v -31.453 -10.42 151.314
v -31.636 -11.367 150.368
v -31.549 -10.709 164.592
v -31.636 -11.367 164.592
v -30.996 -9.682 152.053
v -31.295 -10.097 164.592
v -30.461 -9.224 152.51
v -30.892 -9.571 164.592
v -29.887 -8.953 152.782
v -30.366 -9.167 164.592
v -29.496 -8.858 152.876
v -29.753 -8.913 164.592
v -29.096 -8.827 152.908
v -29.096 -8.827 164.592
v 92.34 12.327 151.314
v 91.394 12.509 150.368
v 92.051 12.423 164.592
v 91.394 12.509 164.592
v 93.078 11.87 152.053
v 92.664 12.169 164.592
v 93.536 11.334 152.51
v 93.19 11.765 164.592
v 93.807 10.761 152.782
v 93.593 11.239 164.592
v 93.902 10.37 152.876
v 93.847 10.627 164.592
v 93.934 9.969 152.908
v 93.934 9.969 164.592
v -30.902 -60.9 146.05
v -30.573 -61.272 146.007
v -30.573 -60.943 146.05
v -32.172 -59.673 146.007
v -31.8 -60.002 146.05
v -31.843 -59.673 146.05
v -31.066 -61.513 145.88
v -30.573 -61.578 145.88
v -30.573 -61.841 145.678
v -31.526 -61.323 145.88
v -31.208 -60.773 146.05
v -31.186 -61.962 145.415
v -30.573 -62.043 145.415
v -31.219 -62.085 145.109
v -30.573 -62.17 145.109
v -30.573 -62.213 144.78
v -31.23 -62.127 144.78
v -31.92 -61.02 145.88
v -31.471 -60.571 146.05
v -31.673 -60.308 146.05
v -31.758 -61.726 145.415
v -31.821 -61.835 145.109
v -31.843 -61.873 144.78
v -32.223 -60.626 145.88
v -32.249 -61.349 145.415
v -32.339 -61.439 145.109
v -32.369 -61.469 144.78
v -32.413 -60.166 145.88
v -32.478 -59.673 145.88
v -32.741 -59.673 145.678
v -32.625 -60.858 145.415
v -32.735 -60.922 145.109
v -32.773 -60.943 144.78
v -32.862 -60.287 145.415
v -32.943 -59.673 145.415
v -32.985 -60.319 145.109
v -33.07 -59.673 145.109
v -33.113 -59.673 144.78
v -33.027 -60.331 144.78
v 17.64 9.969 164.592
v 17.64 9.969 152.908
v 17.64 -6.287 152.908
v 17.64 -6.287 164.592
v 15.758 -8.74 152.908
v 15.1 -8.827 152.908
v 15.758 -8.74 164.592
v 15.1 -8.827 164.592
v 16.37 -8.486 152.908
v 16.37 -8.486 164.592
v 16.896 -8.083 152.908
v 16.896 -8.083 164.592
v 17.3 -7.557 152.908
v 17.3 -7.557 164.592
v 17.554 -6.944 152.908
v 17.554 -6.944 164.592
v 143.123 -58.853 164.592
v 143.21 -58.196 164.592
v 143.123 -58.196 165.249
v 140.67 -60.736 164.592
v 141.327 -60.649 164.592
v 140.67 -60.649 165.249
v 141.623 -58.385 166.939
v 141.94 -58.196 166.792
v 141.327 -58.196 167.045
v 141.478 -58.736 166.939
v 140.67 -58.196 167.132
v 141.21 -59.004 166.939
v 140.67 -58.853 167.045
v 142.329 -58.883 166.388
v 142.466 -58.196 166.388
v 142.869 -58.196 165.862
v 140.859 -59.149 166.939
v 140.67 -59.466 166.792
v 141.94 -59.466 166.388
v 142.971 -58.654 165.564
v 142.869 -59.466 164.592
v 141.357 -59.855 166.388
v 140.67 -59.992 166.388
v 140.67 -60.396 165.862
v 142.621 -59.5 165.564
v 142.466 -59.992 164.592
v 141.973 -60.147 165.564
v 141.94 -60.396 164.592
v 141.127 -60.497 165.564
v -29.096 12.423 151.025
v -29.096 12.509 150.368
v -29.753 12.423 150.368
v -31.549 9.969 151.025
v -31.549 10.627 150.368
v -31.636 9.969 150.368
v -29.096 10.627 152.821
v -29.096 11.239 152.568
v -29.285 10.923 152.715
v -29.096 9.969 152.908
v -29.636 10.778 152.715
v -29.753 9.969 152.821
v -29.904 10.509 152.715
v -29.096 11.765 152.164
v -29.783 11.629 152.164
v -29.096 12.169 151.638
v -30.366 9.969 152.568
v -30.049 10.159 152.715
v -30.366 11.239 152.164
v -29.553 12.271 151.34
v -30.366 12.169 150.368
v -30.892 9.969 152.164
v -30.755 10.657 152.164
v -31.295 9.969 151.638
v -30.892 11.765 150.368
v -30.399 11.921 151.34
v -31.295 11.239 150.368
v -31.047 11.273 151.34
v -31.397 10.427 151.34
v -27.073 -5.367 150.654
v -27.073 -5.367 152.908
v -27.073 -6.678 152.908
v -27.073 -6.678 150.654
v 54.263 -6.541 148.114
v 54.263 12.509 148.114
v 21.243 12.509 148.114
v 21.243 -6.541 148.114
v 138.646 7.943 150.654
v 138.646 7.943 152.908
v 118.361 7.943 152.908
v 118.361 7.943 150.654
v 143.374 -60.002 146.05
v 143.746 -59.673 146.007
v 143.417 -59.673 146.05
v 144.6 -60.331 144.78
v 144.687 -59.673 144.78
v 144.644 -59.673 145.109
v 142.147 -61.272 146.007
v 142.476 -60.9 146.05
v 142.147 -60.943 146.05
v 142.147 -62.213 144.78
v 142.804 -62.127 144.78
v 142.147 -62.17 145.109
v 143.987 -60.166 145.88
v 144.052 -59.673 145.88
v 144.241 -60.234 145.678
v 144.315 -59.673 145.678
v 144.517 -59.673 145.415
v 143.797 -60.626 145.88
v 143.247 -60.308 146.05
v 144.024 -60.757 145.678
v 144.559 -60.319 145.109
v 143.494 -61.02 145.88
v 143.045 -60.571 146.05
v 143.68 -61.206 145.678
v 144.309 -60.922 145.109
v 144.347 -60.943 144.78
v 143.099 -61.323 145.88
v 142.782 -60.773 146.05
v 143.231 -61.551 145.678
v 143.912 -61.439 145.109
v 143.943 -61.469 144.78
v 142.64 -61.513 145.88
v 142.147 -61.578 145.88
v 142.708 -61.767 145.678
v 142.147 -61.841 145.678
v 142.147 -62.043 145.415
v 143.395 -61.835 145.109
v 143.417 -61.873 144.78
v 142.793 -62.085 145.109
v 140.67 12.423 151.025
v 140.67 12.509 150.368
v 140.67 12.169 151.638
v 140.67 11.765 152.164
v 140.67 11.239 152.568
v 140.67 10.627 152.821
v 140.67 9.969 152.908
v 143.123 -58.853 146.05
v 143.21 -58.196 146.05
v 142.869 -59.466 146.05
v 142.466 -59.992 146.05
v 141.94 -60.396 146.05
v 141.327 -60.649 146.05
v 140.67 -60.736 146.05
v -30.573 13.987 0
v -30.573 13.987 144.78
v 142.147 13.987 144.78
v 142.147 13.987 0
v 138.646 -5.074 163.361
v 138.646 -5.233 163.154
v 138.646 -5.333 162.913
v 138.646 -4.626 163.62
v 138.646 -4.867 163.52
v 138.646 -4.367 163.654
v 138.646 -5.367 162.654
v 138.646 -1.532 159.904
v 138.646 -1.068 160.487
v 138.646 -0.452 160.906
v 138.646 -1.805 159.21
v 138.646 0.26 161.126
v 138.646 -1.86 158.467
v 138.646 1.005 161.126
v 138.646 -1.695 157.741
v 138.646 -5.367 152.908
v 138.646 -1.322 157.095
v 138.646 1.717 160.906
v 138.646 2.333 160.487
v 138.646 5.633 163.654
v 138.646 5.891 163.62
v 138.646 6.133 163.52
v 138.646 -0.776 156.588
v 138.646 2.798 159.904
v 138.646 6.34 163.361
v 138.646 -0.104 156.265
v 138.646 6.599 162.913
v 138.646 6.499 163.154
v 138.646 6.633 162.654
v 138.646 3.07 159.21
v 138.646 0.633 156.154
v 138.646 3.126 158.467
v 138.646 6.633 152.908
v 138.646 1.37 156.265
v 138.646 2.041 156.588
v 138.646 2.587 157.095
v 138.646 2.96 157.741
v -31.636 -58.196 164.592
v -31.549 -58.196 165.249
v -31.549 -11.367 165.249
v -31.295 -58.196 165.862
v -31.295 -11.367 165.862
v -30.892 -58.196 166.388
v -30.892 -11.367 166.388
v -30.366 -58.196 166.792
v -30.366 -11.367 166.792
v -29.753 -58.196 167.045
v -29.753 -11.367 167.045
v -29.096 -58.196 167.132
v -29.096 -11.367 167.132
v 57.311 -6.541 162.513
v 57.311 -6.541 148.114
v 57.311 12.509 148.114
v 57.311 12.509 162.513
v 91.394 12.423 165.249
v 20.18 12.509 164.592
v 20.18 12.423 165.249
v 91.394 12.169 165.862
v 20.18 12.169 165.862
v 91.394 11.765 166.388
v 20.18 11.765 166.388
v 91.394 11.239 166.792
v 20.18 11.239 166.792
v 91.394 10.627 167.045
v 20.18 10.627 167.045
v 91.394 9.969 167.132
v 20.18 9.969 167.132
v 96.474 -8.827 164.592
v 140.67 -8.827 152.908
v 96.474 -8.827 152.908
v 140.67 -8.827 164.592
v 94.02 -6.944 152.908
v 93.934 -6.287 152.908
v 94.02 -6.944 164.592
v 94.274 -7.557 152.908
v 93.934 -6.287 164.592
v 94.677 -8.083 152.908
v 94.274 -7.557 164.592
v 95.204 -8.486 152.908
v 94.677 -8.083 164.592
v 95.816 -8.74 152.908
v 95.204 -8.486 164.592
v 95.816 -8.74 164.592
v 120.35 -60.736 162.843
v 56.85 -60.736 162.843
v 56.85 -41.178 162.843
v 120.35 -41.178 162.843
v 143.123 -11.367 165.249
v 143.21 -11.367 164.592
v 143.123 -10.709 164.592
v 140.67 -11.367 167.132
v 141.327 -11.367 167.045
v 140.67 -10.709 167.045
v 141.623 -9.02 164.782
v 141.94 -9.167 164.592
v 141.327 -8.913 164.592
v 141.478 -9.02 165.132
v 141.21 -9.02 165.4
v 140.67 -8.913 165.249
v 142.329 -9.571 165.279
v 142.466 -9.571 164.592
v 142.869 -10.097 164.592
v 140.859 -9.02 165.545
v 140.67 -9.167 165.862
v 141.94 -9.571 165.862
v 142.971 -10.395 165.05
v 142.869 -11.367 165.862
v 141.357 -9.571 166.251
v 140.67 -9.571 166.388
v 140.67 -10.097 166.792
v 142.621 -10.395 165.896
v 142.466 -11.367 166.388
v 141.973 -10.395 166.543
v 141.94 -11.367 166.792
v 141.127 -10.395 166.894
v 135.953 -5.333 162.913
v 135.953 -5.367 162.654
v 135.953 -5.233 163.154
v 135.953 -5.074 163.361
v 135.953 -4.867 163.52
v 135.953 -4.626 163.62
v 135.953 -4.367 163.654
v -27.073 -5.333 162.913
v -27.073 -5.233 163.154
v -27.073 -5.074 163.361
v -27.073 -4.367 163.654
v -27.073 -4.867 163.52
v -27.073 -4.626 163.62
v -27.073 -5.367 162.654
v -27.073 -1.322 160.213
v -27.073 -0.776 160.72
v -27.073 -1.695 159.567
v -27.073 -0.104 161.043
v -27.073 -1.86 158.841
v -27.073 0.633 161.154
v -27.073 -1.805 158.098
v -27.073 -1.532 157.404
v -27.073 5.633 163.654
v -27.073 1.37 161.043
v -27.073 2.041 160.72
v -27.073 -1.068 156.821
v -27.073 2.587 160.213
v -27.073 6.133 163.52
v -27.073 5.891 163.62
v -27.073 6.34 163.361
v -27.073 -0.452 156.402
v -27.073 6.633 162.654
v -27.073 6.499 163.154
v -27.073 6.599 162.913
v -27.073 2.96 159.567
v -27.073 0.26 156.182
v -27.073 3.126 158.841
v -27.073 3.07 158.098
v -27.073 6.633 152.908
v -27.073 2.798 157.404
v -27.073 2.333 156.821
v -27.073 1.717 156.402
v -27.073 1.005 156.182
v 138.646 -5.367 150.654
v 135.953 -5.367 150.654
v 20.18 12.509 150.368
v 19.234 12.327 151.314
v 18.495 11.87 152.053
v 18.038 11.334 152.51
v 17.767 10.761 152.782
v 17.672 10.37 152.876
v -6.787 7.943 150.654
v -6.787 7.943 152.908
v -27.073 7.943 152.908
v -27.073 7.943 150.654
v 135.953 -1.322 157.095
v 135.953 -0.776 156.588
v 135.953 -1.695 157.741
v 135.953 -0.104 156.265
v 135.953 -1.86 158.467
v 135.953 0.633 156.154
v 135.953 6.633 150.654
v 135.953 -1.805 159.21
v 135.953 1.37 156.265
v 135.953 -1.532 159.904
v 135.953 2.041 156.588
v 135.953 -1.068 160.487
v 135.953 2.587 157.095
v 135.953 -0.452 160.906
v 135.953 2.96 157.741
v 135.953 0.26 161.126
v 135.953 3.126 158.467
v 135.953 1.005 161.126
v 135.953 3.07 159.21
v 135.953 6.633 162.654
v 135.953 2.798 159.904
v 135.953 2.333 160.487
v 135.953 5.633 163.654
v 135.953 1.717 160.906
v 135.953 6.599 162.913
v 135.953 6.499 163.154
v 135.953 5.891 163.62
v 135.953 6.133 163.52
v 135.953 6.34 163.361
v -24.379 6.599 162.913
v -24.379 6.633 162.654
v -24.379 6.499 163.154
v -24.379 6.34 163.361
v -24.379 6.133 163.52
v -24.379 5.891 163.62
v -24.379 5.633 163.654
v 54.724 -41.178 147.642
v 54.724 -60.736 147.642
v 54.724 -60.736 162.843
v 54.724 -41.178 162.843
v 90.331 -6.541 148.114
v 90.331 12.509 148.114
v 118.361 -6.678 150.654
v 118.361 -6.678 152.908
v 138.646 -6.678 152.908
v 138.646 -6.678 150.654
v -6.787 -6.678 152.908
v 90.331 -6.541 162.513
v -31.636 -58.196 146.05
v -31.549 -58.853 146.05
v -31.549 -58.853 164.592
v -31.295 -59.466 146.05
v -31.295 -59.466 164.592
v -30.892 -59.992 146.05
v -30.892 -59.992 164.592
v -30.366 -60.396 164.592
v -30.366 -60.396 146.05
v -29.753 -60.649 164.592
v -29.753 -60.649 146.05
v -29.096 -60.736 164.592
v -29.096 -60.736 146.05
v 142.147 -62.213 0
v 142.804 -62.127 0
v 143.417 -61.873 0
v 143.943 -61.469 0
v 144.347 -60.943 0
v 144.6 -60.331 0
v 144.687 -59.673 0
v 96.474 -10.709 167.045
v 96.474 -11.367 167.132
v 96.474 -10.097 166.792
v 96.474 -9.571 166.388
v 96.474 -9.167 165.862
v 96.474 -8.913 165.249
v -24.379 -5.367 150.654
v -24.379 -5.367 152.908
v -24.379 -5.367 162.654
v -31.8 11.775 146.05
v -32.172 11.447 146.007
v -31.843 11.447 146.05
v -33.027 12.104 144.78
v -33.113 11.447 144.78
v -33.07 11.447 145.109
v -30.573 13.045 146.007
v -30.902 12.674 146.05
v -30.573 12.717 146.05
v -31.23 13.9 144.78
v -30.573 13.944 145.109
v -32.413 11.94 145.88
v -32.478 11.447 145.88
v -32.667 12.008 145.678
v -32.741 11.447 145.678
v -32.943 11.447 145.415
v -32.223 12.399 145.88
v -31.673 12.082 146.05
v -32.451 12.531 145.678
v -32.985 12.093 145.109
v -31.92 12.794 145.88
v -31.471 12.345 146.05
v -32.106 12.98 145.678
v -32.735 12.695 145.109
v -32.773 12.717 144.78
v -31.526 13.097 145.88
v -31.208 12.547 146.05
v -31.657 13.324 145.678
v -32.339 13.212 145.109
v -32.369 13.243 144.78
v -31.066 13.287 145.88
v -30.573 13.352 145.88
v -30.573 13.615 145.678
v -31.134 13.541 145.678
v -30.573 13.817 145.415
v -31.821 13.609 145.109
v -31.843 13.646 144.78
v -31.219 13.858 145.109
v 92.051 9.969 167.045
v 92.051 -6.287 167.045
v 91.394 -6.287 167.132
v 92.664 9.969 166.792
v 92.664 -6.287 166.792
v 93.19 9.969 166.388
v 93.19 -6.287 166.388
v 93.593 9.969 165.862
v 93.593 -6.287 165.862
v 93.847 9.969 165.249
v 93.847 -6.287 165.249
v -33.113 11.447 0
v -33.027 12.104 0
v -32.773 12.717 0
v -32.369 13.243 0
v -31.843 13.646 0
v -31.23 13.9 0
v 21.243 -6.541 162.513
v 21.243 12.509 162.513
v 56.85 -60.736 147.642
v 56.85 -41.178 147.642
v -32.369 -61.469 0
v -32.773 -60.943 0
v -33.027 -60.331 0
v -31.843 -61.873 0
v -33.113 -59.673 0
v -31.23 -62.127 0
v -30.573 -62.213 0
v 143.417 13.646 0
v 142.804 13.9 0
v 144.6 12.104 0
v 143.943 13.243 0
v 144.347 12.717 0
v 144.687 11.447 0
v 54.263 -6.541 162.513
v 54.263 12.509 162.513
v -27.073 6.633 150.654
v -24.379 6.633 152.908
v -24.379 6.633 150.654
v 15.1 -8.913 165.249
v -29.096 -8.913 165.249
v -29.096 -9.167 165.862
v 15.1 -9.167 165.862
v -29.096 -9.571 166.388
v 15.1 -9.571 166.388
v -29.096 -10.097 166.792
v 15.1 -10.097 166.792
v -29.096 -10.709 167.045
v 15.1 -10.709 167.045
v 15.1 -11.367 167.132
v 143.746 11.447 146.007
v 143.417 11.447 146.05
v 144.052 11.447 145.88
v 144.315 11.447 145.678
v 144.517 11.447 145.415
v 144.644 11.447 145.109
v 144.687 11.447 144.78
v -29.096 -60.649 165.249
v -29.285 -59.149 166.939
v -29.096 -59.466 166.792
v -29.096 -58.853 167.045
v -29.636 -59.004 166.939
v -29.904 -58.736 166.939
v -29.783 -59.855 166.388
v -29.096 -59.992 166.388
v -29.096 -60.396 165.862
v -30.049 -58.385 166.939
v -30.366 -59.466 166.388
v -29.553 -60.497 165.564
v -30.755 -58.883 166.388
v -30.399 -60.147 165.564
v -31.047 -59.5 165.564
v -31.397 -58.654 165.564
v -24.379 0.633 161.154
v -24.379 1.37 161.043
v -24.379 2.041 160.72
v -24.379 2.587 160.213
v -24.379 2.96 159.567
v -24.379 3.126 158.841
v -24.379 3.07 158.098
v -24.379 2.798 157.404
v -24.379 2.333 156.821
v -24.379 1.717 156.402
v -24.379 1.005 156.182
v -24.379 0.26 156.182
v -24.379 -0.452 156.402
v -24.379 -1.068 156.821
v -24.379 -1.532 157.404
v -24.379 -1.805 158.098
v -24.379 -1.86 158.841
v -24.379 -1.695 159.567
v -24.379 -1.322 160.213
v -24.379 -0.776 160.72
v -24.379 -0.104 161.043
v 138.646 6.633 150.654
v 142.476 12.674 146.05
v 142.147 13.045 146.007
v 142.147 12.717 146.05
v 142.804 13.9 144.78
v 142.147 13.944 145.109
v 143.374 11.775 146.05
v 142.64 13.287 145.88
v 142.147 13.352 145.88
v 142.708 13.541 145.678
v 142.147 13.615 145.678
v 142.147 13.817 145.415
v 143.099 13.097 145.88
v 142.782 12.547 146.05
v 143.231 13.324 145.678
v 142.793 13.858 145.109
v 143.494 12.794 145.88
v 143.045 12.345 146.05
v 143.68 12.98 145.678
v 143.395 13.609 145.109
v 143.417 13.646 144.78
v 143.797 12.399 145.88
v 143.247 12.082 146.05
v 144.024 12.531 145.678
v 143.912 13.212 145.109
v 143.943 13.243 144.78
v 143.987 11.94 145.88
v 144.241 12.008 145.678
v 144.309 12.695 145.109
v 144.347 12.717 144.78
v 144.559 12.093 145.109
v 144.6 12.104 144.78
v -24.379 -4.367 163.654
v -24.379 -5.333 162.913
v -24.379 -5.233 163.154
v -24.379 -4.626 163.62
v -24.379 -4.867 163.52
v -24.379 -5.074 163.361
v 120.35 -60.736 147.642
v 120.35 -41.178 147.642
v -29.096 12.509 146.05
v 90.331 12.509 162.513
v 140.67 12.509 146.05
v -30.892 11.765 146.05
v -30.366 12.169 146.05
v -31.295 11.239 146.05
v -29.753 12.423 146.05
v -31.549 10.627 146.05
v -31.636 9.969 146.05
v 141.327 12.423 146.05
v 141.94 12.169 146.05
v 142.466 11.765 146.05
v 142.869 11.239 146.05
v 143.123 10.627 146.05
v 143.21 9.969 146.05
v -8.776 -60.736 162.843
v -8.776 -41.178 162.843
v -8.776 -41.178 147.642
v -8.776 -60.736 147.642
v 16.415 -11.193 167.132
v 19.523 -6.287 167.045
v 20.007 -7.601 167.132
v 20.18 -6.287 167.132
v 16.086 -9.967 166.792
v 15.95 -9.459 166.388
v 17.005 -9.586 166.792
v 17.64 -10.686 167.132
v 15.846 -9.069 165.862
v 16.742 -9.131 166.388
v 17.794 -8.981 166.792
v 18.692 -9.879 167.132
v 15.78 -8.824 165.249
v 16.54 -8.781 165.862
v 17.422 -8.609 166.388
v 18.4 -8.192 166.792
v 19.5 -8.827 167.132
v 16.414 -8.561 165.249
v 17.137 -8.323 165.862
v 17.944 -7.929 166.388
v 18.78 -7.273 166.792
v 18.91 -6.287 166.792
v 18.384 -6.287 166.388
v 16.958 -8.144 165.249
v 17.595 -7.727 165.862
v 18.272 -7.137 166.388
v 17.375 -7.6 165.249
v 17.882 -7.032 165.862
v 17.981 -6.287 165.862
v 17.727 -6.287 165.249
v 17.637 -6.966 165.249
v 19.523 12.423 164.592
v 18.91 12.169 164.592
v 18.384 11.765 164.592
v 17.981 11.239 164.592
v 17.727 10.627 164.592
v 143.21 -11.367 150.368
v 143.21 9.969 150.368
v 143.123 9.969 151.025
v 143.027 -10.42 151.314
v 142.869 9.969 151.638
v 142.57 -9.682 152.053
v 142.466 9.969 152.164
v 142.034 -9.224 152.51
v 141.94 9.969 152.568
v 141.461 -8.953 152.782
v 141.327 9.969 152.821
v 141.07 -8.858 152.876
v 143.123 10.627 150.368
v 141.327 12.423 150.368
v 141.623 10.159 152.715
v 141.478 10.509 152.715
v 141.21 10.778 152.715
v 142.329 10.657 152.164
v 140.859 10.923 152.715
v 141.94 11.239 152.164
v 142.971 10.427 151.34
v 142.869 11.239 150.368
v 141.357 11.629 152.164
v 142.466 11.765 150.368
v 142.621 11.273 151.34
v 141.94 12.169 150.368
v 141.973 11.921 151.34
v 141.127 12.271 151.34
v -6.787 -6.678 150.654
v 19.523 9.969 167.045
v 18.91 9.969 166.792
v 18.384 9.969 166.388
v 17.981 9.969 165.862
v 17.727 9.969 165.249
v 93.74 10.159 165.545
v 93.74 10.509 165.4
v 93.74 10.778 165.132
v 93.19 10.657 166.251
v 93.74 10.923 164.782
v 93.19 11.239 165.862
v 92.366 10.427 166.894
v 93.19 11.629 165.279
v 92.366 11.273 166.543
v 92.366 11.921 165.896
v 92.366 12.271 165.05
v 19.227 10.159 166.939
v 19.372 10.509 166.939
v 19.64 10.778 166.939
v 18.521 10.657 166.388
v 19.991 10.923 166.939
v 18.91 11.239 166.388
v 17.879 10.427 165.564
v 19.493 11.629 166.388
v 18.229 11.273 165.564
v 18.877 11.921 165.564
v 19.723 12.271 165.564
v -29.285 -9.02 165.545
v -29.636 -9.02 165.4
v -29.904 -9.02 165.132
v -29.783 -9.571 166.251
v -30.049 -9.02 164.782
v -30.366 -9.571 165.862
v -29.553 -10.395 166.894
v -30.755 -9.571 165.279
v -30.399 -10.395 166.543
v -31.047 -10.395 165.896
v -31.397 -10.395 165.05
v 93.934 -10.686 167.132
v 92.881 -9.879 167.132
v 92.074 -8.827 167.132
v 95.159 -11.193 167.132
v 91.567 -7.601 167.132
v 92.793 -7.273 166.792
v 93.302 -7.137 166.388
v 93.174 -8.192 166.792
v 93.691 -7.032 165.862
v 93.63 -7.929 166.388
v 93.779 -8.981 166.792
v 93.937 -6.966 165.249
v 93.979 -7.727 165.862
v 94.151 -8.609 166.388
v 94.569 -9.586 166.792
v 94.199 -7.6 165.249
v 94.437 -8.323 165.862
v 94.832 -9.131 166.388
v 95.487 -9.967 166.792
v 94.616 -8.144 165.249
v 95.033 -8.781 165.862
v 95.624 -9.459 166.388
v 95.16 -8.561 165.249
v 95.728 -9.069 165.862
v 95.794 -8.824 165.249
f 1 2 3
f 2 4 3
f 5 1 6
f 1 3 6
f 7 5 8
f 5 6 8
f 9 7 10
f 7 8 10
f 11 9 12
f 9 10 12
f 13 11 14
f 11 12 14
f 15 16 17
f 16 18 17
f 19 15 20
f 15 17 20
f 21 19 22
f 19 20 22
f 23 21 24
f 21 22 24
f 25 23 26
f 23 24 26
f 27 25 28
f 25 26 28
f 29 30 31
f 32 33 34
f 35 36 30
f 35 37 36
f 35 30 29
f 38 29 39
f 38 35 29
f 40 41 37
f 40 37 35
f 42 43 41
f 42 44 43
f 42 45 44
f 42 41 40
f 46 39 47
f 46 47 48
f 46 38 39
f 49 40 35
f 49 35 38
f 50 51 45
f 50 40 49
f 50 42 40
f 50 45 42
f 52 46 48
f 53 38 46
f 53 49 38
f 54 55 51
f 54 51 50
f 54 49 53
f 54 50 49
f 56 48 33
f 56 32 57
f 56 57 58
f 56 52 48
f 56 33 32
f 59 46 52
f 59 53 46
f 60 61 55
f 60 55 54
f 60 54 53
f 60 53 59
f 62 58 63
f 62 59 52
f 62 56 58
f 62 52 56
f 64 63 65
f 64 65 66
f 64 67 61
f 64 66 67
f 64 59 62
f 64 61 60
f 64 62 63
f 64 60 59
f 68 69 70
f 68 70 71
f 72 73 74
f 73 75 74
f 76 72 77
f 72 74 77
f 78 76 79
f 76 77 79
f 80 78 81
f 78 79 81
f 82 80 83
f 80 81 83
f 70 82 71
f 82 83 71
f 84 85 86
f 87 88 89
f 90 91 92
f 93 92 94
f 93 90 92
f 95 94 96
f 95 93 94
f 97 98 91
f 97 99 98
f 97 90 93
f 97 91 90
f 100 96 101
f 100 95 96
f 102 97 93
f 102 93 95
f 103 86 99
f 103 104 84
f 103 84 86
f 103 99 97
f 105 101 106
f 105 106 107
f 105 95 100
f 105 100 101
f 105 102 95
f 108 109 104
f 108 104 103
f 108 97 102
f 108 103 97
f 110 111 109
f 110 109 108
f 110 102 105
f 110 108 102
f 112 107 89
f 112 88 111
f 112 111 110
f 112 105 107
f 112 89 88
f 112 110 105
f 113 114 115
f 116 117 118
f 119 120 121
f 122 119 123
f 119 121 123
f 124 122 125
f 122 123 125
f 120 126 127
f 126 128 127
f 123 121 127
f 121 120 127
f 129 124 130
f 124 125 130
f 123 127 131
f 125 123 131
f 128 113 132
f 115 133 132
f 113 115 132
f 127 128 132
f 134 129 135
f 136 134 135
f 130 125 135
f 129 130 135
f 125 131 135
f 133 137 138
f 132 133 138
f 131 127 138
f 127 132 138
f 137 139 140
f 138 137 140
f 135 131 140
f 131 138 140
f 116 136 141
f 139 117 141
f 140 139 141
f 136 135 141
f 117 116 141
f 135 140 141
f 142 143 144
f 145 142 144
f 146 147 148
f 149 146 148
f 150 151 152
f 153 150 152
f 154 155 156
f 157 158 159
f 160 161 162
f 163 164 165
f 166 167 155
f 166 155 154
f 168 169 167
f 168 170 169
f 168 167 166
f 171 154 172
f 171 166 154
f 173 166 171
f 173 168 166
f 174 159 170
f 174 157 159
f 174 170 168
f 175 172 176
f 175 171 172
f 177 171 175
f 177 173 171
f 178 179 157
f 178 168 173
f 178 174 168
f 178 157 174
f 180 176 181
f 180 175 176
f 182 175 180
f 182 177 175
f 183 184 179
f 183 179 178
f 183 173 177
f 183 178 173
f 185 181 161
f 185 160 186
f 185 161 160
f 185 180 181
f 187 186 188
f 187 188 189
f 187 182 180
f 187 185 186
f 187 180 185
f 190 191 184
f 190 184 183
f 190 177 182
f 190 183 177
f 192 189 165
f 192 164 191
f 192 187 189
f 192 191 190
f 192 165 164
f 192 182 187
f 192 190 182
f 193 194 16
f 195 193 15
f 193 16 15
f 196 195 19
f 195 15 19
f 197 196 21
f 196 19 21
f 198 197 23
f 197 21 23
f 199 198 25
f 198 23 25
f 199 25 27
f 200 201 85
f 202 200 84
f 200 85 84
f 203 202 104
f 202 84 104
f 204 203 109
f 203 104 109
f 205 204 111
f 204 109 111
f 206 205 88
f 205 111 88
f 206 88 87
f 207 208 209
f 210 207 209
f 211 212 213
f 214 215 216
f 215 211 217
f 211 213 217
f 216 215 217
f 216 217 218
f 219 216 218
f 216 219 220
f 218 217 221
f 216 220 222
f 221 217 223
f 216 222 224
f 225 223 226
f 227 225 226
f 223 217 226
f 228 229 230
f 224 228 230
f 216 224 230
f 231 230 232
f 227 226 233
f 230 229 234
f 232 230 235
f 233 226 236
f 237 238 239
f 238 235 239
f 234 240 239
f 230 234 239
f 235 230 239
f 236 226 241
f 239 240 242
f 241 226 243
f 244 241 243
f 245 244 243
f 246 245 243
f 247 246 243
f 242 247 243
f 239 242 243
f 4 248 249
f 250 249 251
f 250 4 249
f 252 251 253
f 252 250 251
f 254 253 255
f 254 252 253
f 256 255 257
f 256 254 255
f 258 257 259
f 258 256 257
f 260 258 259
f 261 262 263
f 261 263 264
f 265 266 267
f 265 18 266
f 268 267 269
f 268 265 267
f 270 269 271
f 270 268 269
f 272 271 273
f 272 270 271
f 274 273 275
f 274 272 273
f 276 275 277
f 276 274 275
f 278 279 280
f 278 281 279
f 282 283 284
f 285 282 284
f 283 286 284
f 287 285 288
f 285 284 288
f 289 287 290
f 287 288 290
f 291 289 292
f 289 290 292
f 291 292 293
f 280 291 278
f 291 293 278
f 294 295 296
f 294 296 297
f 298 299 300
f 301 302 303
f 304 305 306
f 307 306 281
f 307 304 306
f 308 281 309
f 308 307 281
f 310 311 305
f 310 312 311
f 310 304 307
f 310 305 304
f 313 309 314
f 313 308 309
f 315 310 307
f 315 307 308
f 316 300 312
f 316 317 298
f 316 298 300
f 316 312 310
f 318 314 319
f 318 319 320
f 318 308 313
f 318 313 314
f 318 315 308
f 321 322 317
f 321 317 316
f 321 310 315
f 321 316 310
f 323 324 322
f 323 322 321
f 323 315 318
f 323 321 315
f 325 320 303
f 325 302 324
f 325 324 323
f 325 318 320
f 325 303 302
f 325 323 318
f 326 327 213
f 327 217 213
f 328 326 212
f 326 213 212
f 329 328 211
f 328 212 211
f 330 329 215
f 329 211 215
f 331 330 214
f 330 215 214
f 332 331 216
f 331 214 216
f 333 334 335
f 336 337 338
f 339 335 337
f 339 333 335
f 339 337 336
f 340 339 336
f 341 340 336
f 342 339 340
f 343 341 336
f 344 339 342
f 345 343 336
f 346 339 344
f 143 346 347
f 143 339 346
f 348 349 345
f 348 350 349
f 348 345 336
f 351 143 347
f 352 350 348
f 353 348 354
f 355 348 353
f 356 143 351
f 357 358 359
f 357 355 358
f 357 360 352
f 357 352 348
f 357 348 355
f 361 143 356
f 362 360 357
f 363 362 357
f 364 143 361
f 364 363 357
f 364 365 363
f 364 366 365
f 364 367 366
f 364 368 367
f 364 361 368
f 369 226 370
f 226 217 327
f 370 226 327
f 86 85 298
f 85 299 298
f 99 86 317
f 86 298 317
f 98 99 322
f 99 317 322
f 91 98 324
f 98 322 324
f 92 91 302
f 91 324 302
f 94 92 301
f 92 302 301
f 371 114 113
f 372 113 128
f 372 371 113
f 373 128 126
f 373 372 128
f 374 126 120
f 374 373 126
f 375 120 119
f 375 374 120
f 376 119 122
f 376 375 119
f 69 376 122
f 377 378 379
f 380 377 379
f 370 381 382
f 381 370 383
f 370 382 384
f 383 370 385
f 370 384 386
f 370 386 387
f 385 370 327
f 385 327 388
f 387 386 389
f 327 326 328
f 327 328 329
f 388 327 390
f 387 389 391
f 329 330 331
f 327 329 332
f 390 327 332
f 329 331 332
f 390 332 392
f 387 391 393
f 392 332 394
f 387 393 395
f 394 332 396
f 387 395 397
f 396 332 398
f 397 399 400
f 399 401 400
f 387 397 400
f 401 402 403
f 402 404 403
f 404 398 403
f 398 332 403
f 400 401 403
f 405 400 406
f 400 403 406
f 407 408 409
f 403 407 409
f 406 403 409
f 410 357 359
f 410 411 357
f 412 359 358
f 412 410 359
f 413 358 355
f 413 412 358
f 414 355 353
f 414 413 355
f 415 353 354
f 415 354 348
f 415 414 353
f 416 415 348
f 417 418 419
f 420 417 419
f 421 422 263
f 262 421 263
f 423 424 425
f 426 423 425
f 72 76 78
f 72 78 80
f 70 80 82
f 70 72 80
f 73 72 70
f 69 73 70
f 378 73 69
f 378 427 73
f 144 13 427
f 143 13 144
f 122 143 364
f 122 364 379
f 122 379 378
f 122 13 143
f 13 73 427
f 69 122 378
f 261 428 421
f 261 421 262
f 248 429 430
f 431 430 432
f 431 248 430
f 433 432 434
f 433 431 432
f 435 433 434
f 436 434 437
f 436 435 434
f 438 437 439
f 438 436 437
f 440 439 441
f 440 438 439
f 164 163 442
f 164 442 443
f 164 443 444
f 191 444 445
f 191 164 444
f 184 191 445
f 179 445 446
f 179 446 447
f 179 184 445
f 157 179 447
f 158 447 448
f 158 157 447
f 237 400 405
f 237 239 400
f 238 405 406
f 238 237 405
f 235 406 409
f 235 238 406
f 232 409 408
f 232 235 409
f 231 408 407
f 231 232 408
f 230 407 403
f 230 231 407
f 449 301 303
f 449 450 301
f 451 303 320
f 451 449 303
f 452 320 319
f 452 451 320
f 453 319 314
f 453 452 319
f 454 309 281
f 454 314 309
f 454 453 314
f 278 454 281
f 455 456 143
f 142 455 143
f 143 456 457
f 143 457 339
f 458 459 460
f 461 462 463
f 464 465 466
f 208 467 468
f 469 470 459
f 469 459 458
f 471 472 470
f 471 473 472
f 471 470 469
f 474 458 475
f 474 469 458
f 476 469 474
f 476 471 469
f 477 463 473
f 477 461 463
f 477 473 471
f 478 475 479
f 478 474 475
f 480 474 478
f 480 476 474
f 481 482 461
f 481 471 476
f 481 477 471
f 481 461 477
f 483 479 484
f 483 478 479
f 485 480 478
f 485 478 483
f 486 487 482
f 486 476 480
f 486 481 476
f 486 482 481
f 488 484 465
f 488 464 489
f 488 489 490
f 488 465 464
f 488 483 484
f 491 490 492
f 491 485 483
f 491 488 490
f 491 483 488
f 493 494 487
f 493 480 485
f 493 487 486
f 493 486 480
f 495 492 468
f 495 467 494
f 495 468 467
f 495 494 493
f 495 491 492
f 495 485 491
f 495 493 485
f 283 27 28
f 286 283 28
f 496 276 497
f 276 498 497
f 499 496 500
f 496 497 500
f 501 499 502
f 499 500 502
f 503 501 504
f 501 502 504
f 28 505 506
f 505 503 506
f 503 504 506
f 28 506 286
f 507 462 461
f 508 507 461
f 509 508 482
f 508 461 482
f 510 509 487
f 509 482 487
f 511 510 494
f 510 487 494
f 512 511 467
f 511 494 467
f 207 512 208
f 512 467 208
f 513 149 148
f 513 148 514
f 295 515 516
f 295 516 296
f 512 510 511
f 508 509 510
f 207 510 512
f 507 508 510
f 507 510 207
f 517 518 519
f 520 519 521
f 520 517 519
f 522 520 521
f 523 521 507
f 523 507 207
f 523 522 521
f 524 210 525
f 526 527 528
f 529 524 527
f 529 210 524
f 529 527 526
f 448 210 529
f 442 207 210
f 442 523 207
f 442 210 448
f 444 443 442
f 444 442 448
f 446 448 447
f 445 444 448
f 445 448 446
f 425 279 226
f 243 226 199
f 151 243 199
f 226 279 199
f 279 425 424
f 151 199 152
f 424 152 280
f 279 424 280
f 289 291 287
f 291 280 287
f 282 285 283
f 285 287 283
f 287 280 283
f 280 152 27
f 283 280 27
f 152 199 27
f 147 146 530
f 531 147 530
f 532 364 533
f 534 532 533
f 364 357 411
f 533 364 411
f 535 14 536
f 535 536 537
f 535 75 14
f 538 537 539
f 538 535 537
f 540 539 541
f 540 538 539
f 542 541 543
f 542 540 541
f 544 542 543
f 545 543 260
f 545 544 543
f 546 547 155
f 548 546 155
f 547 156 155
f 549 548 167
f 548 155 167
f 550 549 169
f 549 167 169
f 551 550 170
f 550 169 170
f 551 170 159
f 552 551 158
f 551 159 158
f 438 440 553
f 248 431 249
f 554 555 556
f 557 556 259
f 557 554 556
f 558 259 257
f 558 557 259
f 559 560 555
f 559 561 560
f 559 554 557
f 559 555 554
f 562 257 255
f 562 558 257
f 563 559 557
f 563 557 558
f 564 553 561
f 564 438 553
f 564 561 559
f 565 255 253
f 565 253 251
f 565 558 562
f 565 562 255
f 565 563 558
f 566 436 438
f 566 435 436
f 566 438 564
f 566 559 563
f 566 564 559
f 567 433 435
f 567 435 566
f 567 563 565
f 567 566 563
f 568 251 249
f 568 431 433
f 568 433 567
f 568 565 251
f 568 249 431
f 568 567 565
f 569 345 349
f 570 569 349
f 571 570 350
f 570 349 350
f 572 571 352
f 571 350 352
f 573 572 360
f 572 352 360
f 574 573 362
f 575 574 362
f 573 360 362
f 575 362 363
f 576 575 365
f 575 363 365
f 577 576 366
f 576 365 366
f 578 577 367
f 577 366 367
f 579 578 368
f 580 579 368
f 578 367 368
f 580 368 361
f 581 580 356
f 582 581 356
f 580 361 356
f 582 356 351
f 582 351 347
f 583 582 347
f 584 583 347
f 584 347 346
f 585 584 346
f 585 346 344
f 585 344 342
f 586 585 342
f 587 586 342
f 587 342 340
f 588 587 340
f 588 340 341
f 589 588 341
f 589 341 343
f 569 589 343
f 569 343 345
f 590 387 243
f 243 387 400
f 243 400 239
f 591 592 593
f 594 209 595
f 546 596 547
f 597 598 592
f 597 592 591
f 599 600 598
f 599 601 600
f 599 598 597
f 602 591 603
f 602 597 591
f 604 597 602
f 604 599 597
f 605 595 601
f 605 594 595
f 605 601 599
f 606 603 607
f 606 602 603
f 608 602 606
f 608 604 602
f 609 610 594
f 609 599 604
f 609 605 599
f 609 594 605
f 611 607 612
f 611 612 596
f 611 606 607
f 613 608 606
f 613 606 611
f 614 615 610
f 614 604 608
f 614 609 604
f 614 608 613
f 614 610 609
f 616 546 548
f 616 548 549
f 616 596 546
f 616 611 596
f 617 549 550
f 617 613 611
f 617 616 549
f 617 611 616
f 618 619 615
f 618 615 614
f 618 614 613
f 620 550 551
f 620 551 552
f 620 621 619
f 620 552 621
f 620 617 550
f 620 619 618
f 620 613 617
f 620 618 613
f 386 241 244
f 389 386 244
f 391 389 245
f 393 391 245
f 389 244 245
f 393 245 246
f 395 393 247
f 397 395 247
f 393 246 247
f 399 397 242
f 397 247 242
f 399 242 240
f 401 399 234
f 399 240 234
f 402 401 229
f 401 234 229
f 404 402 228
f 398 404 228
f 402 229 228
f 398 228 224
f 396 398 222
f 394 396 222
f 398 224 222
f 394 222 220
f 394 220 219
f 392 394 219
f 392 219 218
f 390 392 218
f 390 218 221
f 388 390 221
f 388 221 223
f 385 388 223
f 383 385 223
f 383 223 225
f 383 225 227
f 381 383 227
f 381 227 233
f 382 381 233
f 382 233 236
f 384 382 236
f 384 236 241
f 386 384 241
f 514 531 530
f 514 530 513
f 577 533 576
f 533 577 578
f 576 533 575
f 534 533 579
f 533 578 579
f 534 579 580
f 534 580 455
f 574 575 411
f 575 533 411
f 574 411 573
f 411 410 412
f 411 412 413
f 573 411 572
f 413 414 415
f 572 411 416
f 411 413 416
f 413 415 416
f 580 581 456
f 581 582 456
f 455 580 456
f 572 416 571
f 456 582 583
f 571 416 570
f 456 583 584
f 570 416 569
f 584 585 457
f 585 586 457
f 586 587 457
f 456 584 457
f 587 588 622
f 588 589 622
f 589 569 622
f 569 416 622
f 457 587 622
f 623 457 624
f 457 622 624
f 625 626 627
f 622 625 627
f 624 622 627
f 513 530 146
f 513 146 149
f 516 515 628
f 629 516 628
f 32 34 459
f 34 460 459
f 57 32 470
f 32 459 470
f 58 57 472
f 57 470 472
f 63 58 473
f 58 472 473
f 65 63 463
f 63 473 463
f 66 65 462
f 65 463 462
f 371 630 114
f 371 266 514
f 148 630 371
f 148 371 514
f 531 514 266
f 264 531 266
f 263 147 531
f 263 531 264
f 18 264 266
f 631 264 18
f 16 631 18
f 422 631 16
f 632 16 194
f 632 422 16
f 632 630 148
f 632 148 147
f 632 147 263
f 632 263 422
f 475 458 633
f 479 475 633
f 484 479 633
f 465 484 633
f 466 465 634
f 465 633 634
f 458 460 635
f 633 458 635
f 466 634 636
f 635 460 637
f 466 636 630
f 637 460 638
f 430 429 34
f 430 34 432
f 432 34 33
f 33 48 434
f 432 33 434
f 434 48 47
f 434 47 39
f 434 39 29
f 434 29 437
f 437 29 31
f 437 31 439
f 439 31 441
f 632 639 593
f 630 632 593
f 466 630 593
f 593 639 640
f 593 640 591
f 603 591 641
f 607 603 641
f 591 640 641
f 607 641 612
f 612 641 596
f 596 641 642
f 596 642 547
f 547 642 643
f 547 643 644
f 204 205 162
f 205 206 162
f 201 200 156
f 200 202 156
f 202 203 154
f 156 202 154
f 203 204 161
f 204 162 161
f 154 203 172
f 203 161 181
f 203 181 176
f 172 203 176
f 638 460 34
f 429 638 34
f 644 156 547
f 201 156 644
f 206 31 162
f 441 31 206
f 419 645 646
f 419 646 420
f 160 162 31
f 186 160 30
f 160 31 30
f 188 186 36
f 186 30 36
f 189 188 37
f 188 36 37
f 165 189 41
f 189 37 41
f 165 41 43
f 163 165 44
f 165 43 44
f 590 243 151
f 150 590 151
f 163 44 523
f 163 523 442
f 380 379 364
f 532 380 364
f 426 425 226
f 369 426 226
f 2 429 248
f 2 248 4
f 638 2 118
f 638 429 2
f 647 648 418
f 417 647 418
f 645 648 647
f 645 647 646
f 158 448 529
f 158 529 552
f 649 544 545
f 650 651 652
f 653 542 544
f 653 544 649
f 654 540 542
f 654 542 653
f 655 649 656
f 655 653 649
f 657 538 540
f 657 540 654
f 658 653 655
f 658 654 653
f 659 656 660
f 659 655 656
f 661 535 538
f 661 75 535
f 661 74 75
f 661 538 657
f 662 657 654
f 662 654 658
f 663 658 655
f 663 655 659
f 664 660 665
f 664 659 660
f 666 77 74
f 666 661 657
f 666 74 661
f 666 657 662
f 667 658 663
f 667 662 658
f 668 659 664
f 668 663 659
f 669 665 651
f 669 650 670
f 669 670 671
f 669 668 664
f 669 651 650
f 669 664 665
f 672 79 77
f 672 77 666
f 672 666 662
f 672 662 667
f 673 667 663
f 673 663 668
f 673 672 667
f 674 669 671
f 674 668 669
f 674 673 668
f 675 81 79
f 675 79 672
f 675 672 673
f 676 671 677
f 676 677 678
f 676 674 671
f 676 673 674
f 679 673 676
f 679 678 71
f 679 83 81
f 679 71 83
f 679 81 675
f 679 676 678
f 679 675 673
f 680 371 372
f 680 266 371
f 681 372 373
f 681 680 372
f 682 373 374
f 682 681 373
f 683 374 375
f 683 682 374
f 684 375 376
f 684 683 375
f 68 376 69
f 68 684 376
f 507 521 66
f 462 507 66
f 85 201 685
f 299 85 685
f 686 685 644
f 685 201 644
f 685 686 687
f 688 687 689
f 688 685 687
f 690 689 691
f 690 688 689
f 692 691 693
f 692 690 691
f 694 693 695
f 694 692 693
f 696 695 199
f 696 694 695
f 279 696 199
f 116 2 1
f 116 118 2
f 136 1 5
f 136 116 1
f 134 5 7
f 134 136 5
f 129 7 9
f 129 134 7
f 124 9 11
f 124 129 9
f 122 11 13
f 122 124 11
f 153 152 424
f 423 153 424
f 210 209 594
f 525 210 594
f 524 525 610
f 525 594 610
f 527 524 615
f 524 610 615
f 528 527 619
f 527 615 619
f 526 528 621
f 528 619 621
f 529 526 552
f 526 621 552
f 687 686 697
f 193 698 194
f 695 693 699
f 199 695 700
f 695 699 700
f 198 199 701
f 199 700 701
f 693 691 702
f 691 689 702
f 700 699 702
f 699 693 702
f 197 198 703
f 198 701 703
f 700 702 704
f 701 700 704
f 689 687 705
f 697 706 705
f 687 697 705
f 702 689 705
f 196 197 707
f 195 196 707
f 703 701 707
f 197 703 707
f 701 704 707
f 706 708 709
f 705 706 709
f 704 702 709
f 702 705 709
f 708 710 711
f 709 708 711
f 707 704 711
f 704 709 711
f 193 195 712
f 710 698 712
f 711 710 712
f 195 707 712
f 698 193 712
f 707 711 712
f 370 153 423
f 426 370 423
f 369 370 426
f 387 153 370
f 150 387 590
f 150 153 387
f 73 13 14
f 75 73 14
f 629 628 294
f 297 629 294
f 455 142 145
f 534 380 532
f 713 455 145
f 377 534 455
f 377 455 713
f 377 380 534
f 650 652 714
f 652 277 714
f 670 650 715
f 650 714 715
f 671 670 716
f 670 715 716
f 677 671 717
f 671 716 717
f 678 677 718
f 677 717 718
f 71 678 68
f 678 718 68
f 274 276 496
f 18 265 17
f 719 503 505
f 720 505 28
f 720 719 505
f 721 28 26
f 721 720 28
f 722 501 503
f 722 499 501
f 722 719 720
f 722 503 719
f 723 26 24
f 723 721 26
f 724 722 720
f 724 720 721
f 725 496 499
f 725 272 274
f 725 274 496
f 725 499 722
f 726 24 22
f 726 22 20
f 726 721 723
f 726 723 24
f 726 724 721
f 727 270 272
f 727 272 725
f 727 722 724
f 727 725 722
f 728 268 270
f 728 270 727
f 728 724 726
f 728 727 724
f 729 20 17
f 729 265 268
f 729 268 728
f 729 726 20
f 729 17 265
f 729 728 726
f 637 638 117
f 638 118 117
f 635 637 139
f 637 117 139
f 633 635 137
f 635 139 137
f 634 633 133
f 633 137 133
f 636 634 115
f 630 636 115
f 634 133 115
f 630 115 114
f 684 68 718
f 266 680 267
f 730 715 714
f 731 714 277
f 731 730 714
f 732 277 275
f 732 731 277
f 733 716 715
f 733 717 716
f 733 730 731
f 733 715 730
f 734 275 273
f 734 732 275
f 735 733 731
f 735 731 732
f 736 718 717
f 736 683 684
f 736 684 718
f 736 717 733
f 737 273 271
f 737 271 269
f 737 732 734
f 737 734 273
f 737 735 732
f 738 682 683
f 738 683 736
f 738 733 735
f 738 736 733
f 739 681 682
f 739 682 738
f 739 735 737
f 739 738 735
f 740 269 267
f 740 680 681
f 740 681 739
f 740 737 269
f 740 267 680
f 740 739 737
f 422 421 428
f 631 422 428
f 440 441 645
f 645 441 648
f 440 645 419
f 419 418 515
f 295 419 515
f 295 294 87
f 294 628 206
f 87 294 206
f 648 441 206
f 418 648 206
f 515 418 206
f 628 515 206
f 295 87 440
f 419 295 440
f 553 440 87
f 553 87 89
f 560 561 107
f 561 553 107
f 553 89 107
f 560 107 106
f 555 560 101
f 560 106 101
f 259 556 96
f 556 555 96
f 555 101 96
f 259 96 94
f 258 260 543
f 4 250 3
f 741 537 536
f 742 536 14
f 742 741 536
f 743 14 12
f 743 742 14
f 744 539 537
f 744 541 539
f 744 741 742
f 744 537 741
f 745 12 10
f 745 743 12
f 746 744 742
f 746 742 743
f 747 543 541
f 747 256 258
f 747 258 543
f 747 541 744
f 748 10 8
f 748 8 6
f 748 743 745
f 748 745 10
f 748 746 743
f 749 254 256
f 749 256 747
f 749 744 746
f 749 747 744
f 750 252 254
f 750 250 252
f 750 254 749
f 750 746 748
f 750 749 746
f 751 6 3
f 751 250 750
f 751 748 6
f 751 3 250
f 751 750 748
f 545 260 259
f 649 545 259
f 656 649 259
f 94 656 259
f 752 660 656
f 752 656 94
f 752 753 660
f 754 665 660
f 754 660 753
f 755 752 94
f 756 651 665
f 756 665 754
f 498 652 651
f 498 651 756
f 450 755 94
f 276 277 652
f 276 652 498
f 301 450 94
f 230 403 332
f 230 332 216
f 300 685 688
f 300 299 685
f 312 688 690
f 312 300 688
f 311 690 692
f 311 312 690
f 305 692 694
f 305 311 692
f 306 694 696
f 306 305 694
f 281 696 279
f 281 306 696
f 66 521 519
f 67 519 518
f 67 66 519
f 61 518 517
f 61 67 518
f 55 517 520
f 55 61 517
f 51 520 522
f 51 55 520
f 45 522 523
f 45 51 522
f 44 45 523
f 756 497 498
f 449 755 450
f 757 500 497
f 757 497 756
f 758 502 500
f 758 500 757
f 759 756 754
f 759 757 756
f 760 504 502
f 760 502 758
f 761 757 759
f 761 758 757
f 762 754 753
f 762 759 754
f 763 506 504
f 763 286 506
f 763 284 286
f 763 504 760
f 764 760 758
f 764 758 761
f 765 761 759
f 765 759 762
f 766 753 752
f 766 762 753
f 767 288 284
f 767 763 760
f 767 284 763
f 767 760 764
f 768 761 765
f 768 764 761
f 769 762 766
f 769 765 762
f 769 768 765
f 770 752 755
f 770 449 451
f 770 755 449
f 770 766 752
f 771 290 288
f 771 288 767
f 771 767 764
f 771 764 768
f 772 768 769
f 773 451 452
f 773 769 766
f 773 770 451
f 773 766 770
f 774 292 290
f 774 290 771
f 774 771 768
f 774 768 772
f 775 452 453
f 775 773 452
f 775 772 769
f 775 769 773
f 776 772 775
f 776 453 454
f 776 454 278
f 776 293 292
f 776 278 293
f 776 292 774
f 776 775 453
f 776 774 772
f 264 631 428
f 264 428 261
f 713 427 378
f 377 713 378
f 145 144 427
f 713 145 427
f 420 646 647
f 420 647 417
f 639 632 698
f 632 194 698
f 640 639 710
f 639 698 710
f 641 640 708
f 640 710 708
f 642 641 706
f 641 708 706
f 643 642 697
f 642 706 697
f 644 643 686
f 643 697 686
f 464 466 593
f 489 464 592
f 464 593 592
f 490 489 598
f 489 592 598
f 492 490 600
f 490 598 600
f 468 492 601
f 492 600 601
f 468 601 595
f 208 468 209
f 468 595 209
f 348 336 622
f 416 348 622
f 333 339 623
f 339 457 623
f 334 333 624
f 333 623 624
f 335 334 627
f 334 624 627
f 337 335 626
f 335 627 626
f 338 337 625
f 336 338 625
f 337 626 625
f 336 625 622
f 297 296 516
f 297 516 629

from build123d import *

# Parameters (mm, degrees)
SKETCH1_W                    = 177.8
SKETCH1_H                    = 146.05
BOSS_EXTRUDE1_DEPTH          = 76.2
SKETCH2_W                    = 174.845239449
SKETCH2_H                    = 73.245239449
BOSS_EXTRUDE2_DEPTH          = 21.082
SKETCH3_W                    = 14.224
SKETCH3_H                    = 21.336
CUT_EXTRUDE1_DEPTH           = 49.276
SKETCH4_W                    = 2.693561453
SKETCH4_H                    = 12
BOSS_EXTRUDE3_DEPTH          = 10.746
CUT_EXTRUDE2_DEPTH           = 2.254
SKETCH6_W                    = 49.276
SKETCH6_H                    = 14.224
CUT_EXTRUDE3_DEPTH           = 21.336
SKETCH7_W                    = 2.693561452
SKETCH7_H                    = 12
BOSS_EXTRUDE4_DEPTH          = 10.746
CUT_EXTRUDE4_DEPTH           = 2.254
SKETCH9_W                    = 33.02
SKETCH9_H                    = 14.399652357
CUT_EXTRUDE5_DEPTH           = 19.05
SKETCH10_W                   = 33.02
SKETCH10_H                   = 14.399652357
CUT_EXTRUDE6_DEPTH           = 19.05
SKETCH11_W                   = 63.5
SKETCH11_H                   = 15.201284342
CUT_EXTRUDE7_DEPTH           = 19.558
SKETCH12_W                   = 63.5
SKETCH12_H                   = 15.201284342
CUT_EXTRUDE8_DEPTH           = 19.558
F_5_0_5_DIAMETER_HOLE1_D     = 5
F_5_0_5_DIAMETER_HOLE1_DEPTH = 8.734014926
F_5_0_5_DIAMETER_HOLE2_D     = 5
F_5_0_5_DIAMETER_HOLE2_DEPTH = 8.734014926
FILLET1_R                    = 2.54
FILLET2_R                    = 1
FILLET3_R                    = 1.27


with BuildPart() as part:
    # Sketch1 → Boss-Extrude1 (new body)
    with BuildSketch(Plane.XZ.offset(62.213215728)):
        with Locations((55.786931477, 73.025)):
            Rectangle(SKETCH1_W, SKETCH1_H)
    extrude(amount=-BOSS_EXTRUDE1_DEPTH)

    # Sketch2 → Boss-Extrude2 (add)
    with BuildSketch(Plane.XY.offset(146.05)):
        with Locations((55.786931477, -24.113215728)):
            Rectangle(SKETCH2_W, SKETCH2_H)
    extrude(amount=BOSS_EXTRUDE2_DEPTH)

    # Sketch3 → Cut-Extrude1 (cut)
    with BuildSketch(Plane.ZY.offset(31.635688247)):
        with Locations((160.02, 1.841403997)):
            Rectangle(SKETCH3_W, SKETCH3_H)
    extrude(amount=-CUT_EXTRUDE1_DEPTH, mode=Mode.SUBTRACT)

    # Sketch4 → Boss-Extrude3 (add)
    with BuildSketch(Plane.XY.offset(152.908)):
        with Locations((-25.725834324, 0.632623113)):
            Rectangle(SKETCH4_W, SKETCH4_H)
    extrude(amount=BOSS_EXTRUDE3_DEPTH)

    # Sketch5 → Cut-Extrude2 (cut)
    with BuildSketch(Plane.XY.offset(152.908)):
        Polygon((-27.07261505, 6.632623113), (-24.379053597, 6.632623113), (-24.379053597, -5.367376887), (-27.07261505, -5.367376887), (-27.07261505, -6.677584717), (-6.787176985, -6.677584717), (-6.787176985, 7.942830943), (-27.07261505, 7.942830943), align=None)
    extrude(amount=-CUT_EXTRUDE2_DEPTH, mode=Mode.SUBTRACT)

    # Sketch6 → Cut-Extrude3 (cut)
    with BuildSketch(Plane(origin=(0, 12.509403997, 0), x_dir=(-1, 0, 0), z_dir=(0, 1, 0))):
        with Locations((-118.571551202, 160.02)):
            Rectangle(SKETCH6_W, SKETCH6_H)
    extrude(amount=-CUT_EXTRUDE3_DEPTH, mode=Mode.SUBTRACT)

    # Sketch7 → Boss-Extrude4 (add)
    with BuildSketch(Plane.XY.offset(152.908)):
        with Locations((137.299697278, 0.632623113)):
            Rectangle(SKETCH7_W, SKETCH7_H)
    extrude(amount=BOSS_EXTRUDE4_DEPTH)

    # Sketch8 → Cut-Extrude4 (cut)
    with BuildSketch(Plane.XY.offset(152.908)):
        Polygon((138.646478004, -5.367376887), (135.952916552, -5.367376887), (135.952916552, 6.632623113), (138.646478004, 6.632623113), (138.646478004, 7.942830943), (118.361039939, 7.942830943), (118.361039939, -6.677584717), (138.646478004, -6.677584717), align=None)
    extrude(amount=-CUT_EXTRUDE4_DEPTH, mode=Mode.SUBTRACT)

    # Sketch9 → Cut-Extrude5 (cut)
    with BuildSketch(Plane(origin=(0, 12.509403997, 0), x_dir=(-1, 0, 0), z_dir=(0, 1, 0))):
        with Locations((-73.820931477, 155.313650768)):
            Rectangle(SKETCH9_W, SKETCH9_H)
    extrude(amount=-CUT_EXTRUDE5_DEPTH, mode=Mode.SUBTRACT)

    # Sketch10 → Cut-Extrude6 (cut)
    with BuildSketch(Plane(origin=(0, 12.509403997, 0), x_dir=(-1, 0, 0), z_dir=(0, 1, 0))):
        with Locations((-37.752931477, 155.313650768)):
            Rectangle(SKETCH10_W, SKETCH10_H)
    extrude(amount=-CUT_EXTRUDE6_DEPTH, mode=Mode.SUBTRACT)

    # Sketch11 → Cut-Extrude7 (cut)
    with BuildSketch(Plane.XZ.offset(60.735835452)):
        with Locations((88.599551202, 155.2427389)):
            Rectangle(SKETCH11_W, SKETCH11_H)
    extrude(amount=-CUT_EXTRUDE7_DEPTH, mode=Mode.SUBTRACT)

    # Sketch12 → Cut-Extrude8 (cut)
    with BuildSketch(Plane.XZ.offset(60.735835452)):
        with Locations((22.974311753, 155.2427389)):
            Rectangle(SKETCH12_W, SKETCH12_H)
    extrude(amount=-CUT_EXTRUDE8_DEPTH, mode=Mode.SUBTRACT)

    # 5.0 _5_ Diameter Hole1
    with Locations(Plane.ZY.offset(-135.952916552)):
        with Locations((158.654, 0.632623113)):
            Hole(F_5_0_5_DIAMETER_HOLE1_D / 2, depth=F_5_0_5_DIAMETER_HOLE1_DEPTH)

    # 5.0 _5_ Diameter Hole2
    with Locations(Plane(origin=(-24.379053597, 0, 0), x_dir=(0, 0, -1), z_dir=(1, 0, 0))):
        with Locations((-158.654, 0.632623113)):
            Hole(F_5_0_5_DIAMETER_HOLE2_D / 2, depth=F_5_0_5_DIAMETER_HOLE2_DEPTH)

    # Fillet1
    fillet1_edges = [part.edges().sort_by_distance(p)[0] for p in [
        (144.686931477, 13.986784272, 73.025),
        (143.209551202, -60.735835452, 156.591),
        (-31.635688247, -60.735835452, 156.591),
        (143.209551202, -34.781215728, 167.132),
        (55.786931477, -60.735835452, 167.132),
        (-31.635688247, -34.781215728, 167.132),
        (-31.635688247, 12.509403997, 149.479),
        (17.640311753, 12.509403997, 160.02),
        (-6.997688247, 12.509403997, 152.908),
        (17.640311753, 1.841403997, 167.132),
        (17.640311753, -8.826596003, 160.02),
        (-6.997688247, -8.826596003, 167.132),
        (-31.635688247, 1.841403997, 152.908),
        (-31.635688247, -8.826596003, 160.02),
        (-33.113068523, 13.986784272, 73.025),
        (144.686931477, -62.213215728, 73.025),
        (-33.113068523, -62.213215728, 73.025),
        (55.786931477, 12.509403997, 167.132),
        (143.209551202, 12.509403997, 149.479),
        (143.209551202, -8.826596003, 160.02),
        (143.209551202, 1.841403997, 152.908),
        (118.571551202, -8.826596003, 167.132),
        (93.933551202, -8.826596003, 160.02),
        (93.933551202, 1.841403997, 167.132),
        (118.571551202, 12.509403997, 152.908),
        (93.933551202, 12.509403997, 160.02),
    ]]
    fillet(fillet1_edges, radius=FILLET1_R)

    # Fillet2
    fillet2_edges = [part.edges().sort_by_distance(p)[0] for p in [
        (-25.725834323, 6.632623113, 163.654),
        (-25.725834323, -5.367376887, 163.654),
        (137.299697278, 6.632623113, 163.654),
        (137.299697278, -5.367376887, 163.654),
    ]]
    fillet(fillet2_edges, radius=FILLET2_R)

    # Fillet3
    fillet3_edges = [part.edges().sort_by_distance(p)[0] for p in [
        (-33.113068523, -24.113215728, 146.05),
        (55.786931477, 13.986784272, 146.05),
        (55.786931477, -62.213215728, 146.05),
        (144.686931477, -24.113215728, 146.05),
        (143.942982701, 13.242835496, 146.05),
        (-32.369119747, -61.469266952, 146.05),
        (143.942982701, -61.469266952, 146.05),
        (-32.369119747, 13.242835496, 146.05),
    ]]
    fillet(fillet3_edges, radius=FILLET3_R)


solid = part.part
